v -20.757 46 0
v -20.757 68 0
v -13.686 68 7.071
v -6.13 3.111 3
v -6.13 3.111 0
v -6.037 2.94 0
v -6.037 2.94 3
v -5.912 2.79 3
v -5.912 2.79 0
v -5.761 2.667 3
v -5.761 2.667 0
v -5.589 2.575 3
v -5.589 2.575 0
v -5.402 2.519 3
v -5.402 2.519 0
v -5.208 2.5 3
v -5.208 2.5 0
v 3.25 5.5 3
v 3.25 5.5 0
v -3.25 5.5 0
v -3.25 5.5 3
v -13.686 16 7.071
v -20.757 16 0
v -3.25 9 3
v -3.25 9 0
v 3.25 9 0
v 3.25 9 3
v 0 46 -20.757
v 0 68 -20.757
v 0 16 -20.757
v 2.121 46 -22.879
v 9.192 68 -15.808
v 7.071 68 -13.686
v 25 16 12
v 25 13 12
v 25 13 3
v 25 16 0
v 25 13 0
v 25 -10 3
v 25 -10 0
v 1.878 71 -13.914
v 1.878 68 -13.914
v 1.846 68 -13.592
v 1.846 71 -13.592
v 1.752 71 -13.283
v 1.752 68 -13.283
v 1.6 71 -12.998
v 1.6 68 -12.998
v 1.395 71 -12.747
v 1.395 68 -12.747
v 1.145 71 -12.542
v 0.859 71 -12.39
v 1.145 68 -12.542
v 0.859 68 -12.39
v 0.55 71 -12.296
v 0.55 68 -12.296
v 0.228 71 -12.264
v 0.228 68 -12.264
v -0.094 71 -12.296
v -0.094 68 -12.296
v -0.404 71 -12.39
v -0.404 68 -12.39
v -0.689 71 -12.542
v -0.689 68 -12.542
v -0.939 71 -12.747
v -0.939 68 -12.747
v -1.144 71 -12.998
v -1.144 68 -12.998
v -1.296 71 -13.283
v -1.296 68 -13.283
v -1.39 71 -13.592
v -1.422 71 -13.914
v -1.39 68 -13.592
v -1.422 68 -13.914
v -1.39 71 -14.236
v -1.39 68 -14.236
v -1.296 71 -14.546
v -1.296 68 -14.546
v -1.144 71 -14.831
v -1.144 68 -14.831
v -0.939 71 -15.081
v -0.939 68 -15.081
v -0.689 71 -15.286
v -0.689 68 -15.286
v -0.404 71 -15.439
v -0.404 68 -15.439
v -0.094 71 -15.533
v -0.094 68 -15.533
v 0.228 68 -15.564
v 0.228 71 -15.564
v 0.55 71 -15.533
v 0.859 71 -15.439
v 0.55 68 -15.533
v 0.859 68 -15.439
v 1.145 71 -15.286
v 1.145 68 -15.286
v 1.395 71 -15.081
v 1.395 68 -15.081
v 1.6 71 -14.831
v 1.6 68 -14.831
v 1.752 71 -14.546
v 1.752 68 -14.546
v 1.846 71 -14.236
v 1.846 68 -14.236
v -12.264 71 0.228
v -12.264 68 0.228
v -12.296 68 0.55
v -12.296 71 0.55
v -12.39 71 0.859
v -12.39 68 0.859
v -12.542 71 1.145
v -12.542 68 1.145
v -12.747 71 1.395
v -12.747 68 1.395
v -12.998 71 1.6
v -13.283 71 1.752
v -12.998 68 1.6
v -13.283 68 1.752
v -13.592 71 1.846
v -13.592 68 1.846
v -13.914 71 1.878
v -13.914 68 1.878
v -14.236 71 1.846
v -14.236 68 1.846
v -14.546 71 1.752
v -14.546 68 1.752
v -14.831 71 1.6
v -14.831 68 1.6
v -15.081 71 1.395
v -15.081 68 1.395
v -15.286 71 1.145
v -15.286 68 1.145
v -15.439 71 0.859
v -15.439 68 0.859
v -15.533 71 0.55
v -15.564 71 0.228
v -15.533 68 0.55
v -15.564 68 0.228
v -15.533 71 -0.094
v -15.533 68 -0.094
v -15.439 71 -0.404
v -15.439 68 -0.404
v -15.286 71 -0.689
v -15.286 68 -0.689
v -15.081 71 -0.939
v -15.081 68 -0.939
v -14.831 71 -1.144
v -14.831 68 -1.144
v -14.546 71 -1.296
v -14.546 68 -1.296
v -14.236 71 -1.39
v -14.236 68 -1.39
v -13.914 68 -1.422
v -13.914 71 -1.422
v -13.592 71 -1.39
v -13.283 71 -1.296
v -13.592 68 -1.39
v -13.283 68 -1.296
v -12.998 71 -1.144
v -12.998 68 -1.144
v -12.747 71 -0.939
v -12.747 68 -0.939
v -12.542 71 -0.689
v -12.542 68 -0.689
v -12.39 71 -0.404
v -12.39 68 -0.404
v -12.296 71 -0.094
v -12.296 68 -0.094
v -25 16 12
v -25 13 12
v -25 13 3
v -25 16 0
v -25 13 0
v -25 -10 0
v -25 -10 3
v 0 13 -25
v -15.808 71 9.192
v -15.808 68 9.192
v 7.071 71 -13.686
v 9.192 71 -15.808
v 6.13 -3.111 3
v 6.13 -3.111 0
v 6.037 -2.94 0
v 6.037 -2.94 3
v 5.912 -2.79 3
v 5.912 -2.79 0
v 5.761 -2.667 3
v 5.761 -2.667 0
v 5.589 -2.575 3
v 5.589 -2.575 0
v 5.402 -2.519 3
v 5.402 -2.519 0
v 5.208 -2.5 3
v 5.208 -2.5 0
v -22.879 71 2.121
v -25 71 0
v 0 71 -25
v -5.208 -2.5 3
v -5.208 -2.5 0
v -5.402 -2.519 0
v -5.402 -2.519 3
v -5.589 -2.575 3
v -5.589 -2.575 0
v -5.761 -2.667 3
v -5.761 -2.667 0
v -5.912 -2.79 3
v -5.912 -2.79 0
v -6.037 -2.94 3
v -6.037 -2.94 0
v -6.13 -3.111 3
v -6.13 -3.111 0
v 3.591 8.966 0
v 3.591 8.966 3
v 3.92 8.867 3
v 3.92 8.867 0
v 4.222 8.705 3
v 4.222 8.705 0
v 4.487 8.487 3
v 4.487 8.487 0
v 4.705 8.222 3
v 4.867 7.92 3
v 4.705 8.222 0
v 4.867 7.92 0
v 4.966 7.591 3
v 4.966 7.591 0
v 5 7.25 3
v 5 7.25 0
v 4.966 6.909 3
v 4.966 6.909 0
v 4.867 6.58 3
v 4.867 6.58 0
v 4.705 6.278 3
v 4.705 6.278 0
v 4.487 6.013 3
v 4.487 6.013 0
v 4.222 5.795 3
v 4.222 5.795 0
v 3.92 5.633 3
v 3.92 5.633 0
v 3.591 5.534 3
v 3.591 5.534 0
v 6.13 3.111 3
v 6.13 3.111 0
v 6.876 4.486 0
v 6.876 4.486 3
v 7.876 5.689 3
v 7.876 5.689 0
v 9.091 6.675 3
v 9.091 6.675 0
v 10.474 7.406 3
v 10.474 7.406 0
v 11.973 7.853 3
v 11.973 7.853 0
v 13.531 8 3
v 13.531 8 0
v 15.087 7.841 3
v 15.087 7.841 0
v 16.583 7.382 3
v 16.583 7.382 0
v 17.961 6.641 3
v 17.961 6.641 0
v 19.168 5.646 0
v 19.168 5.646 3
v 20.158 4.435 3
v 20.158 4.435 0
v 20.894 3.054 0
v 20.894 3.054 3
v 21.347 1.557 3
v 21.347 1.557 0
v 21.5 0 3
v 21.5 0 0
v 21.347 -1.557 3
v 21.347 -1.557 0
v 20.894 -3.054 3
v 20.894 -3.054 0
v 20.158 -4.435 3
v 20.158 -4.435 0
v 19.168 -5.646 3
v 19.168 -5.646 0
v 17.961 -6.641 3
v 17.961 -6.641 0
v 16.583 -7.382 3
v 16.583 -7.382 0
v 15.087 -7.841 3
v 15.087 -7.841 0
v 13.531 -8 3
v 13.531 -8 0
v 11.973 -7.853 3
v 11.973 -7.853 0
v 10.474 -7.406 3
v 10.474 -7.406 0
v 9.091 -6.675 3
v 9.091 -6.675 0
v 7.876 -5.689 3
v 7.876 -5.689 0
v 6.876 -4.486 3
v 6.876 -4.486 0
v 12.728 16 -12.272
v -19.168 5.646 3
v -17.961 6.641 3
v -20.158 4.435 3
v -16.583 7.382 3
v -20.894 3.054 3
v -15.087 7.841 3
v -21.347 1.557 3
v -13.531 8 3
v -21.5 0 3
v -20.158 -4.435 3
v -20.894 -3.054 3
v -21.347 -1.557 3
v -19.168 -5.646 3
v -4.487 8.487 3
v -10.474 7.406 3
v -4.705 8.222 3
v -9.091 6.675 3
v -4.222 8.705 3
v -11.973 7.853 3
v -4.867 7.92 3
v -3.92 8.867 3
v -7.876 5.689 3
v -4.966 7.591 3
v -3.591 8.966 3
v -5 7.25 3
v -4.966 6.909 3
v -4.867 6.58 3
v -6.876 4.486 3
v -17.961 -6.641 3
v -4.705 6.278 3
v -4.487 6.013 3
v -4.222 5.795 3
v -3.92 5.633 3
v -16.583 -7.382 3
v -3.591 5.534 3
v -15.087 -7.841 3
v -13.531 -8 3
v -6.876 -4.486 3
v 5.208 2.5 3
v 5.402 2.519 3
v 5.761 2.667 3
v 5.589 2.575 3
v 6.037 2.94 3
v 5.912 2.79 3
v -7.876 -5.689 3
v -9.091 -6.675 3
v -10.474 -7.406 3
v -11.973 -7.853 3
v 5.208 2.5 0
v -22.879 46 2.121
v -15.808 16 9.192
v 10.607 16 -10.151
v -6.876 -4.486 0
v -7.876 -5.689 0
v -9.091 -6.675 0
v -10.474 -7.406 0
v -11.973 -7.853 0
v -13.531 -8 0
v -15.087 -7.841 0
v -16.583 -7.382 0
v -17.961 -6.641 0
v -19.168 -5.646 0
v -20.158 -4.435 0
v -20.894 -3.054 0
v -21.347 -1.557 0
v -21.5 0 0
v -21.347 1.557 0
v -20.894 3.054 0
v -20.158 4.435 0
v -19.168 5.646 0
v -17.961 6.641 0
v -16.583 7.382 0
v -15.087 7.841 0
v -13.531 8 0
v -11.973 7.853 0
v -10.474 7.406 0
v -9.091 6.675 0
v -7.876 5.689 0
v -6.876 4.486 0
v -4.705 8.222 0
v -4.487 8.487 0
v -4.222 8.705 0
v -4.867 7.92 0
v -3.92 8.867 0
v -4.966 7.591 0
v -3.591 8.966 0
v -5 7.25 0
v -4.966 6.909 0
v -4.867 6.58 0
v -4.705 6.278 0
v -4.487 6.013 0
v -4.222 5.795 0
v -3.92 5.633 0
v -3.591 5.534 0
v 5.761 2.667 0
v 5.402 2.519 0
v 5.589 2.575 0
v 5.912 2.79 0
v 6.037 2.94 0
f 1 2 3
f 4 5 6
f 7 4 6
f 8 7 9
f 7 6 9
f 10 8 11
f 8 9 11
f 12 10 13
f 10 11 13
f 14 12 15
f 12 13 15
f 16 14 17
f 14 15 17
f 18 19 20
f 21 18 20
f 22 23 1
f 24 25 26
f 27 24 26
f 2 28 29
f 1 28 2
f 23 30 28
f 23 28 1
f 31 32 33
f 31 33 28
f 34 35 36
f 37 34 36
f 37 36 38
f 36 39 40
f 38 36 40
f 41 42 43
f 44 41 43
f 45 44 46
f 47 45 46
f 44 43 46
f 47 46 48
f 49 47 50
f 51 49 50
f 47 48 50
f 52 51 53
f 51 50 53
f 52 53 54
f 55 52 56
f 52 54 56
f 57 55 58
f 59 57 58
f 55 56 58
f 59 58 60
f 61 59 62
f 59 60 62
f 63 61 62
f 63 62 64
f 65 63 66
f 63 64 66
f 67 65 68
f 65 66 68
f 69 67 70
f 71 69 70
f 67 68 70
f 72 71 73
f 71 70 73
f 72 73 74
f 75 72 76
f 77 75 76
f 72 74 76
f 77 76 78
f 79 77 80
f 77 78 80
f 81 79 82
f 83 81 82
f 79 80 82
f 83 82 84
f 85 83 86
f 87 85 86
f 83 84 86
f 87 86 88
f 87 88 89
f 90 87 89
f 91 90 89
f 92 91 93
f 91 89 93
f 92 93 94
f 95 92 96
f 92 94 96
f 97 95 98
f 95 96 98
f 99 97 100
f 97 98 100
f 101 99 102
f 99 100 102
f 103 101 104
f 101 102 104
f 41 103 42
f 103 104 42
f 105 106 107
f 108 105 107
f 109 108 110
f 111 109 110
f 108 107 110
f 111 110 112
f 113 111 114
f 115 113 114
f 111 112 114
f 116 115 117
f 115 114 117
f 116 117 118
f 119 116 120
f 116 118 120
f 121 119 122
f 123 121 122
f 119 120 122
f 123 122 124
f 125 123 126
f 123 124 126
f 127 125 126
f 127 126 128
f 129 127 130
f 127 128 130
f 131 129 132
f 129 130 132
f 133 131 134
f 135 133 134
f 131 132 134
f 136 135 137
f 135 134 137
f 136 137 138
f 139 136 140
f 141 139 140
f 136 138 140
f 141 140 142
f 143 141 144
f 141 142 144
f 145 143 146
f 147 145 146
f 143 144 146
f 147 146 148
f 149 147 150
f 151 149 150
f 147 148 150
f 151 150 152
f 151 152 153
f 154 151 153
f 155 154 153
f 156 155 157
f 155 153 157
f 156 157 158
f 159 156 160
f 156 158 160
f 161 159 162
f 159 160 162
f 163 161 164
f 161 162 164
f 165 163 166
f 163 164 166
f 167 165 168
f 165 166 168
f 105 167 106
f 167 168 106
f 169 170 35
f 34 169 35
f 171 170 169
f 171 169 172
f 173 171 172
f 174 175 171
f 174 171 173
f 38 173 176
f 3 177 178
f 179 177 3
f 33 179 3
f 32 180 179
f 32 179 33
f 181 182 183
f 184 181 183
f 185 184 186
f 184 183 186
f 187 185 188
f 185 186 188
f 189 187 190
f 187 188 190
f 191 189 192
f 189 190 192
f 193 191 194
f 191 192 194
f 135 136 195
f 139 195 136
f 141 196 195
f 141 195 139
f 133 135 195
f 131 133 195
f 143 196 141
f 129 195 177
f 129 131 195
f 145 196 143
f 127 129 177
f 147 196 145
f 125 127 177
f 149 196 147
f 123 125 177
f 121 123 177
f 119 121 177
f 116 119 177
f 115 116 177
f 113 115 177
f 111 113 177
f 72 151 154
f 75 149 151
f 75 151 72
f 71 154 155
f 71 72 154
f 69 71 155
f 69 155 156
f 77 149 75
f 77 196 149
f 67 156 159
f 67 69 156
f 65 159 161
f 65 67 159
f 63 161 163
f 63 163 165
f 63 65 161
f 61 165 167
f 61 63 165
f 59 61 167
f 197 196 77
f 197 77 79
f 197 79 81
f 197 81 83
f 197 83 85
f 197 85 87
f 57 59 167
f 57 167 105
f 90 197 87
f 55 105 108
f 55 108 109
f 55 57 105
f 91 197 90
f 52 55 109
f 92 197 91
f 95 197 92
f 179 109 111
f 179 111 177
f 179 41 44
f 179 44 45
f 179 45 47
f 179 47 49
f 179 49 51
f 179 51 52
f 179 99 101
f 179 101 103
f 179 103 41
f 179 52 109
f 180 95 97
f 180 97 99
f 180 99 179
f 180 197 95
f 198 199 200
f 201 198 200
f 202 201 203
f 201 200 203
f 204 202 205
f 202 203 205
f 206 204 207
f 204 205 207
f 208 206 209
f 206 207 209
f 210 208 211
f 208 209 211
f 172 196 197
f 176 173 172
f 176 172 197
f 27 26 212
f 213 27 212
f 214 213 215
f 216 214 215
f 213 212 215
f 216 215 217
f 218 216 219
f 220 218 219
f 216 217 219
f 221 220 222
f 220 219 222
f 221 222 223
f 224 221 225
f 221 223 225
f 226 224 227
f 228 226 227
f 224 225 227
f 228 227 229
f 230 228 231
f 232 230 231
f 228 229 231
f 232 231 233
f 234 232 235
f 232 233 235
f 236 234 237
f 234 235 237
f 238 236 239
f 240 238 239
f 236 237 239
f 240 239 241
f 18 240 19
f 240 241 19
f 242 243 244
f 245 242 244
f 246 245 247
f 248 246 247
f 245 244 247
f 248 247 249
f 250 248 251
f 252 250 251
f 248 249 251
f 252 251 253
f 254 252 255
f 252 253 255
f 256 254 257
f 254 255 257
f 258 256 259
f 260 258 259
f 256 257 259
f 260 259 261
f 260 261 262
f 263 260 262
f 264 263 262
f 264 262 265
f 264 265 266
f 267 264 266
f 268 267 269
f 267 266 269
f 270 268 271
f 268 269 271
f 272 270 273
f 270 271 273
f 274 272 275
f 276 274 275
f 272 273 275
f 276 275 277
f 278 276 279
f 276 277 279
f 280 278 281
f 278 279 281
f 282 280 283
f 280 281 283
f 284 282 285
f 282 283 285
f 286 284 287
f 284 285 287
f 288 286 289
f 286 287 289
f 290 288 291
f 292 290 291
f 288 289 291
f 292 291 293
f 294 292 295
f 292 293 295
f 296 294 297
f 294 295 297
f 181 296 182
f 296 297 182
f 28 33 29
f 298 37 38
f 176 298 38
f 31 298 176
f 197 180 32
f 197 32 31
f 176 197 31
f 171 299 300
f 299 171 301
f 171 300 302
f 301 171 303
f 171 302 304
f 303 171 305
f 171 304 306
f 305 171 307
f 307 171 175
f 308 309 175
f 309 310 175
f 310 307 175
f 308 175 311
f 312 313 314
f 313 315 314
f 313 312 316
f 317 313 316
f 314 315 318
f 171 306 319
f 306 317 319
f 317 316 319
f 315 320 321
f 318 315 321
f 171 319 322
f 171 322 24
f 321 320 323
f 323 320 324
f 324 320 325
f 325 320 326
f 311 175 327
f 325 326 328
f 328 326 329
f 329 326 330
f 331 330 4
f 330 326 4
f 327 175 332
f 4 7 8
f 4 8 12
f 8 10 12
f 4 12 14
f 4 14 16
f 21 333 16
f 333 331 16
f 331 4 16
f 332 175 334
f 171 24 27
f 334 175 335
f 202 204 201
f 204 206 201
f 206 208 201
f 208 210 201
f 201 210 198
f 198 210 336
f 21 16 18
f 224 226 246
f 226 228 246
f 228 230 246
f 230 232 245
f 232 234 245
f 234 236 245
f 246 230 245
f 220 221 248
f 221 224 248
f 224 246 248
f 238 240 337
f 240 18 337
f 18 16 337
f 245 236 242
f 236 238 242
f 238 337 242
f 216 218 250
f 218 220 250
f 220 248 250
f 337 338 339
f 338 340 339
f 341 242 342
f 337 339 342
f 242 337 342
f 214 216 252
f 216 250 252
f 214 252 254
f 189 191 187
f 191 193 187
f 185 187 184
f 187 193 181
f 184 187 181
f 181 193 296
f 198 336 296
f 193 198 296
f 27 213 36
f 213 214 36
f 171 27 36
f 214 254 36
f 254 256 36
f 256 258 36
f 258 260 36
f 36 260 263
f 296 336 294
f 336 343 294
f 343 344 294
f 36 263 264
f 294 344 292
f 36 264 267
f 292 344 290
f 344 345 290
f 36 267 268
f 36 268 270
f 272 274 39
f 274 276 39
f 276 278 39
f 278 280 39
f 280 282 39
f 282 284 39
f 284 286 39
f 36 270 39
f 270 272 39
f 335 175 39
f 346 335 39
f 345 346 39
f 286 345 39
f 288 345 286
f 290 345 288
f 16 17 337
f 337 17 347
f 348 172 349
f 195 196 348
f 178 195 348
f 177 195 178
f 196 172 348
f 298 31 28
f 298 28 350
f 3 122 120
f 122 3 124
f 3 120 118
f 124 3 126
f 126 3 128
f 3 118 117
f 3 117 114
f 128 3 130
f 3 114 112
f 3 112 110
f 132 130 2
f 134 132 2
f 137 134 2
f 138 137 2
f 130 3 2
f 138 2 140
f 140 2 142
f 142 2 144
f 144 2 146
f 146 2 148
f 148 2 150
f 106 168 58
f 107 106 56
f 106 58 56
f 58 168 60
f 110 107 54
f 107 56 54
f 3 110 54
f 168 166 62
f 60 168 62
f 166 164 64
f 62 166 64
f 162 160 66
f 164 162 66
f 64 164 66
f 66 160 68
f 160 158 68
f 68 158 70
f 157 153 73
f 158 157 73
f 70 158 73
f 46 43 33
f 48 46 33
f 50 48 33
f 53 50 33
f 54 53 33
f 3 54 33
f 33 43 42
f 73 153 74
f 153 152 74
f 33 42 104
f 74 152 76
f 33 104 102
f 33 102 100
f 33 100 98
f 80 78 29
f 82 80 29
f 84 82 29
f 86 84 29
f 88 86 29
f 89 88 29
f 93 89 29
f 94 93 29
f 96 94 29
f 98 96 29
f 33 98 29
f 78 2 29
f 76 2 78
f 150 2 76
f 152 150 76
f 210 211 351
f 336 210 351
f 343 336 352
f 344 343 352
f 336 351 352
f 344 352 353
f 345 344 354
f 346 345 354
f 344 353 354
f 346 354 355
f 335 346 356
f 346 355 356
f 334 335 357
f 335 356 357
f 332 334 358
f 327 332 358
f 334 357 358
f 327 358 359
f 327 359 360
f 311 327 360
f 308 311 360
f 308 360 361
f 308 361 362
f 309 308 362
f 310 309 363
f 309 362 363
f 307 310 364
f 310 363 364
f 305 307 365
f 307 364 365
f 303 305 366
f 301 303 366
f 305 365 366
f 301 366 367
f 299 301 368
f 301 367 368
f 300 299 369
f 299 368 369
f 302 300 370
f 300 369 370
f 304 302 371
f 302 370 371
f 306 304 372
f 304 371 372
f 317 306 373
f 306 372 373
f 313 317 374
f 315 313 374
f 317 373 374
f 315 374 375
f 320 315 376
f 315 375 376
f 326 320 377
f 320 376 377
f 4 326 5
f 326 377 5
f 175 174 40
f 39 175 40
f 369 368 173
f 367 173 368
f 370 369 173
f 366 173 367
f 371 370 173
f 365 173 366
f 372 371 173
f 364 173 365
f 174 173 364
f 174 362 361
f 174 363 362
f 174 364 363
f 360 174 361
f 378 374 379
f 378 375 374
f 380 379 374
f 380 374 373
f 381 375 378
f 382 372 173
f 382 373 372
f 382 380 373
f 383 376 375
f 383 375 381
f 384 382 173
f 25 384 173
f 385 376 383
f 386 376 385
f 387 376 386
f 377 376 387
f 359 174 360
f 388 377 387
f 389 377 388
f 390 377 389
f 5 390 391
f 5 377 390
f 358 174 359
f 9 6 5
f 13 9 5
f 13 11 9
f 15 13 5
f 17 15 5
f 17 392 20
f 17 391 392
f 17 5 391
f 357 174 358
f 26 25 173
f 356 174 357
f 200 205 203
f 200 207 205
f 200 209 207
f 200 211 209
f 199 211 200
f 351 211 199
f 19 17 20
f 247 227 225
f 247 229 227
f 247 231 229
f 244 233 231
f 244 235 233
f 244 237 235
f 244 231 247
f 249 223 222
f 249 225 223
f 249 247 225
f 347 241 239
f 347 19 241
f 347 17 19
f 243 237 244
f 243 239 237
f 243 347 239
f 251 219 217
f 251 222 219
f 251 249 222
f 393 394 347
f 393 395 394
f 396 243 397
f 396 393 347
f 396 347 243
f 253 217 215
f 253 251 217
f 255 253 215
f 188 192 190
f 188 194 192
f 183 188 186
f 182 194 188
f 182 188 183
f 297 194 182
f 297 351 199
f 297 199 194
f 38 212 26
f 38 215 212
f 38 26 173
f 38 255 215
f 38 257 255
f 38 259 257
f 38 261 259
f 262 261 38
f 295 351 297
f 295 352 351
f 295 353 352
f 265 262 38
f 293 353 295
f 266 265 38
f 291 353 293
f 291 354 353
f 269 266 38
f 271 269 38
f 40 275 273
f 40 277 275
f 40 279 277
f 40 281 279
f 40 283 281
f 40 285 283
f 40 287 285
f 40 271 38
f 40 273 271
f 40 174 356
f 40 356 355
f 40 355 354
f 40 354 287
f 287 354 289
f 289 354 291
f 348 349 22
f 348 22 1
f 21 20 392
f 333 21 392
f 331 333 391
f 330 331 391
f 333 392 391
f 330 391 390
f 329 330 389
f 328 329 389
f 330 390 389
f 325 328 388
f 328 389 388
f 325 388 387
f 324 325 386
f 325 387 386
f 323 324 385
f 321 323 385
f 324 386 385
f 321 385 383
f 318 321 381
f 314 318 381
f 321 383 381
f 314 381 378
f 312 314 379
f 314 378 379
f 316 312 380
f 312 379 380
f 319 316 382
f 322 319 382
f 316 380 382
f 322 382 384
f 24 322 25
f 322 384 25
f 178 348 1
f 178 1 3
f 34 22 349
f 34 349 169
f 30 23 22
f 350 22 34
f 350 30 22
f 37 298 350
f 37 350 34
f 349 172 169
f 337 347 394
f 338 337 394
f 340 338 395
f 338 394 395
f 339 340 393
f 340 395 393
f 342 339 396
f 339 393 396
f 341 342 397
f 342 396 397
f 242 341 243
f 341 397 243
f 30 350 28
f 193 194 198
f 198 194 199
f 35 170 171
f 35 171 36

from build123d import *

# Parameters (mm, degrees)
SKETCH_1_W          = 50
SKETCH_1_H          = 20
EXTRUDE_1_DEPTH     = 3
SKETCH_2_W          = 50
SKETCH_2_H          = 12
EXTRUDE_2_DEPTH     = 6
SKETCH_5_W          = 50
SKETCH_5_H          = 9
CUT_EXTRUDE_2_DEPTH = 3
EXTRUDE_3_DEPTH     = 3
EXTRUDE_4_DEPTH     = 55
SKETCH_12_W         = 32.35533906
SKETCH_12_H         = 3
EXTRUDE_6_DEPTH     = 10
EXTRUDE_7_DEPTH     = 3
EXTRUDE_8_DEPTH     = 3
SKETCH_15_R         = 1.65
CUT_EXTRUDE_3_DEPTH = 3


with BuildPart() as part:
    # 草图1 → 凸台-拉伸1 (new body)
    with BuildSketch(Plane.XY):
        Rectangle(SKETCH_1_W, SKETCH_1_H)
        with BuildLine():
            Line((-5.208438024, 2.5), (5.208438024, 2.5))
            ThreePointArc((5.208438024, 2.5), (5.761208823, 2.666666667), (6.129722688, 3.111111111))
            ThreePointArc((6.129722688, 3.111111111), (21.5, 0), (6.129722688, -3.111111111))
            ThreePointArc((6.129722688, -3.111111111), (5.761208823, -2.666666667), (5.208438024, -2.5))
            Line((5.208438024, -2.5), (-5.208438024, -2.5))
            ThreePointArc((-5.208438024, -2.5), (-5.761208823, -2.666666667), (-6.129722688, -3.111111111))
            ThreePointArc((-6.129722688, -3.111111111), (-21.5, 0), (-6.129722688, 3.111111111))
            ThreePointArc((-6.129722688, 3.111111111), (-5.761208823, 2.666666667), (-5.208438024, 2.5))
        make_face(mode=Mode.SUBTRACT)
        with BuildLine():
            Line((3.25, 5.5), (-3.25, 5.5))
            ThreePointArc((-3.25, 5.5), (-5, 7.25), (-3.25, 9))
            Line((-3.25, 9), (3.25, 9))
            ThreePointArc((3.25, 9), (5, 7.25), (3.25, 5.5))
        make_face(mode=Mode.SUBTRACT)
    extrude(amount=EXTRUDE_1_DEPTH)

    # 草图2 → 凸台-拉伸2 (add)
    with BuildSketch(Plane(origin=(0, 10, 0), x_dir=(1, 0, 0), z_dir=(0, 1, 0))):
        with Locations((0, -6)):
            Rectangle(SKETCH_2_W, SKETCH_2_H)
    extrude(amount=EXTRUDE_2_DEPTH)

    # 草图5 → 切除-拉伸2 (cut)
    with BuildSketch(Plane.XZ.offset(-10)):
        with Locations((0, 7.5)):
            Rectangle(SKETCH_5_W, SKETCH_5_H)
    extrude(amount=-CUT_EXTRUDE_2_DEPTH, mode=Mode.SUBTRACT)

    # 草图9 → 凸台-拉伸3 (add)
    with BuildSketch(Plane(origin=(0, 16, 0), x_dir=(1, 0, 0), z_dir=(0, 1, 0))):
        Polygon((25, 0), (0, 25), (-25, 0), align=None)
    extrude(amount=-EXTRUDE_3_DEPTH)

    # 草图11 → 凸台-拉伸4 (add)
    with BuildSketch(Plane(origin=(0, 16, 0), x_dir=(1, 0, 0), z_dir=(0, 1, 0))):
        Polygon((0, 25), (2.121320344, 22.878679656), (-22.878679656, -2.121320344), (-25, 0), align=None)
    extrude(amount=EXTRUDE_4_DEPTH)

    # 草图12 → 凸台-拉伸6 (add)
    with BuildSketch(Plane(origin=(-10.378679656, 0, -10.378679656), x_dir=(0.707106781, 0, -0.707106781), z_dir=(0.707106781, 0, 0.707106781))):
        with Locations((-1.5, 69.5)):
            Rectangle(SKETCH_12_W, SKETCH_12_H)
    extrude(amount=EXTRUDE_6_DEPTH)

    # 草图13 → 凸台-拉伸7 (add)
    with BuildSketch(Plane(origin=(12.5, 0, -12.5), x_dir=(-0.707106781, 0, -0.707106781), z_dir=(0.707106781, 0, -0.707106781))):
        Polygon((14.67766953, 16), (14.67766953, 46), (-0.32233047, 16), align=None)
        Polygon((14.67766953, 46), (14.67766953, 71), (4.67766953, 71), (4.67766953, 68), align=None)
    extrude(amount=-EXTRUDE_7_DEPTH)

    # 草图14 → 凸台-拉伸8 (add)
    with BuildSketch(Plane(origin=(-12.5, 0, 12.5), x_dir=(0.707106781, 0, 0.707106781), z_dir=(-0.707106781, 0, 0.707106781))):
        Polygon((-14.67766953, 46), (-14.67766953, 16), (-4.67766953, 16), align=None)
        Polygon((-14.67766953, 68), (-14.67766953, 46), (-4.67766953, 68), align=None)
    extrude(amount=-EXTRUDE_8_DEPTH)

    # 草图15 → 切除-拉伸3 (cut)
    with BuildSketch(Plane.XZ.offset(-68)):
        with Locations((0.227922061, -13.914213562)):
            Circle(SKETCH_15_R)
        with Locations((-13.914213562, 0.227922061)):
            Circle(SKETCH_15_R)
    extrude(amount=-CUT_EXTRUDE_3_DEPTH, mode=Mode.SUBTRACT)


solid = part.part
